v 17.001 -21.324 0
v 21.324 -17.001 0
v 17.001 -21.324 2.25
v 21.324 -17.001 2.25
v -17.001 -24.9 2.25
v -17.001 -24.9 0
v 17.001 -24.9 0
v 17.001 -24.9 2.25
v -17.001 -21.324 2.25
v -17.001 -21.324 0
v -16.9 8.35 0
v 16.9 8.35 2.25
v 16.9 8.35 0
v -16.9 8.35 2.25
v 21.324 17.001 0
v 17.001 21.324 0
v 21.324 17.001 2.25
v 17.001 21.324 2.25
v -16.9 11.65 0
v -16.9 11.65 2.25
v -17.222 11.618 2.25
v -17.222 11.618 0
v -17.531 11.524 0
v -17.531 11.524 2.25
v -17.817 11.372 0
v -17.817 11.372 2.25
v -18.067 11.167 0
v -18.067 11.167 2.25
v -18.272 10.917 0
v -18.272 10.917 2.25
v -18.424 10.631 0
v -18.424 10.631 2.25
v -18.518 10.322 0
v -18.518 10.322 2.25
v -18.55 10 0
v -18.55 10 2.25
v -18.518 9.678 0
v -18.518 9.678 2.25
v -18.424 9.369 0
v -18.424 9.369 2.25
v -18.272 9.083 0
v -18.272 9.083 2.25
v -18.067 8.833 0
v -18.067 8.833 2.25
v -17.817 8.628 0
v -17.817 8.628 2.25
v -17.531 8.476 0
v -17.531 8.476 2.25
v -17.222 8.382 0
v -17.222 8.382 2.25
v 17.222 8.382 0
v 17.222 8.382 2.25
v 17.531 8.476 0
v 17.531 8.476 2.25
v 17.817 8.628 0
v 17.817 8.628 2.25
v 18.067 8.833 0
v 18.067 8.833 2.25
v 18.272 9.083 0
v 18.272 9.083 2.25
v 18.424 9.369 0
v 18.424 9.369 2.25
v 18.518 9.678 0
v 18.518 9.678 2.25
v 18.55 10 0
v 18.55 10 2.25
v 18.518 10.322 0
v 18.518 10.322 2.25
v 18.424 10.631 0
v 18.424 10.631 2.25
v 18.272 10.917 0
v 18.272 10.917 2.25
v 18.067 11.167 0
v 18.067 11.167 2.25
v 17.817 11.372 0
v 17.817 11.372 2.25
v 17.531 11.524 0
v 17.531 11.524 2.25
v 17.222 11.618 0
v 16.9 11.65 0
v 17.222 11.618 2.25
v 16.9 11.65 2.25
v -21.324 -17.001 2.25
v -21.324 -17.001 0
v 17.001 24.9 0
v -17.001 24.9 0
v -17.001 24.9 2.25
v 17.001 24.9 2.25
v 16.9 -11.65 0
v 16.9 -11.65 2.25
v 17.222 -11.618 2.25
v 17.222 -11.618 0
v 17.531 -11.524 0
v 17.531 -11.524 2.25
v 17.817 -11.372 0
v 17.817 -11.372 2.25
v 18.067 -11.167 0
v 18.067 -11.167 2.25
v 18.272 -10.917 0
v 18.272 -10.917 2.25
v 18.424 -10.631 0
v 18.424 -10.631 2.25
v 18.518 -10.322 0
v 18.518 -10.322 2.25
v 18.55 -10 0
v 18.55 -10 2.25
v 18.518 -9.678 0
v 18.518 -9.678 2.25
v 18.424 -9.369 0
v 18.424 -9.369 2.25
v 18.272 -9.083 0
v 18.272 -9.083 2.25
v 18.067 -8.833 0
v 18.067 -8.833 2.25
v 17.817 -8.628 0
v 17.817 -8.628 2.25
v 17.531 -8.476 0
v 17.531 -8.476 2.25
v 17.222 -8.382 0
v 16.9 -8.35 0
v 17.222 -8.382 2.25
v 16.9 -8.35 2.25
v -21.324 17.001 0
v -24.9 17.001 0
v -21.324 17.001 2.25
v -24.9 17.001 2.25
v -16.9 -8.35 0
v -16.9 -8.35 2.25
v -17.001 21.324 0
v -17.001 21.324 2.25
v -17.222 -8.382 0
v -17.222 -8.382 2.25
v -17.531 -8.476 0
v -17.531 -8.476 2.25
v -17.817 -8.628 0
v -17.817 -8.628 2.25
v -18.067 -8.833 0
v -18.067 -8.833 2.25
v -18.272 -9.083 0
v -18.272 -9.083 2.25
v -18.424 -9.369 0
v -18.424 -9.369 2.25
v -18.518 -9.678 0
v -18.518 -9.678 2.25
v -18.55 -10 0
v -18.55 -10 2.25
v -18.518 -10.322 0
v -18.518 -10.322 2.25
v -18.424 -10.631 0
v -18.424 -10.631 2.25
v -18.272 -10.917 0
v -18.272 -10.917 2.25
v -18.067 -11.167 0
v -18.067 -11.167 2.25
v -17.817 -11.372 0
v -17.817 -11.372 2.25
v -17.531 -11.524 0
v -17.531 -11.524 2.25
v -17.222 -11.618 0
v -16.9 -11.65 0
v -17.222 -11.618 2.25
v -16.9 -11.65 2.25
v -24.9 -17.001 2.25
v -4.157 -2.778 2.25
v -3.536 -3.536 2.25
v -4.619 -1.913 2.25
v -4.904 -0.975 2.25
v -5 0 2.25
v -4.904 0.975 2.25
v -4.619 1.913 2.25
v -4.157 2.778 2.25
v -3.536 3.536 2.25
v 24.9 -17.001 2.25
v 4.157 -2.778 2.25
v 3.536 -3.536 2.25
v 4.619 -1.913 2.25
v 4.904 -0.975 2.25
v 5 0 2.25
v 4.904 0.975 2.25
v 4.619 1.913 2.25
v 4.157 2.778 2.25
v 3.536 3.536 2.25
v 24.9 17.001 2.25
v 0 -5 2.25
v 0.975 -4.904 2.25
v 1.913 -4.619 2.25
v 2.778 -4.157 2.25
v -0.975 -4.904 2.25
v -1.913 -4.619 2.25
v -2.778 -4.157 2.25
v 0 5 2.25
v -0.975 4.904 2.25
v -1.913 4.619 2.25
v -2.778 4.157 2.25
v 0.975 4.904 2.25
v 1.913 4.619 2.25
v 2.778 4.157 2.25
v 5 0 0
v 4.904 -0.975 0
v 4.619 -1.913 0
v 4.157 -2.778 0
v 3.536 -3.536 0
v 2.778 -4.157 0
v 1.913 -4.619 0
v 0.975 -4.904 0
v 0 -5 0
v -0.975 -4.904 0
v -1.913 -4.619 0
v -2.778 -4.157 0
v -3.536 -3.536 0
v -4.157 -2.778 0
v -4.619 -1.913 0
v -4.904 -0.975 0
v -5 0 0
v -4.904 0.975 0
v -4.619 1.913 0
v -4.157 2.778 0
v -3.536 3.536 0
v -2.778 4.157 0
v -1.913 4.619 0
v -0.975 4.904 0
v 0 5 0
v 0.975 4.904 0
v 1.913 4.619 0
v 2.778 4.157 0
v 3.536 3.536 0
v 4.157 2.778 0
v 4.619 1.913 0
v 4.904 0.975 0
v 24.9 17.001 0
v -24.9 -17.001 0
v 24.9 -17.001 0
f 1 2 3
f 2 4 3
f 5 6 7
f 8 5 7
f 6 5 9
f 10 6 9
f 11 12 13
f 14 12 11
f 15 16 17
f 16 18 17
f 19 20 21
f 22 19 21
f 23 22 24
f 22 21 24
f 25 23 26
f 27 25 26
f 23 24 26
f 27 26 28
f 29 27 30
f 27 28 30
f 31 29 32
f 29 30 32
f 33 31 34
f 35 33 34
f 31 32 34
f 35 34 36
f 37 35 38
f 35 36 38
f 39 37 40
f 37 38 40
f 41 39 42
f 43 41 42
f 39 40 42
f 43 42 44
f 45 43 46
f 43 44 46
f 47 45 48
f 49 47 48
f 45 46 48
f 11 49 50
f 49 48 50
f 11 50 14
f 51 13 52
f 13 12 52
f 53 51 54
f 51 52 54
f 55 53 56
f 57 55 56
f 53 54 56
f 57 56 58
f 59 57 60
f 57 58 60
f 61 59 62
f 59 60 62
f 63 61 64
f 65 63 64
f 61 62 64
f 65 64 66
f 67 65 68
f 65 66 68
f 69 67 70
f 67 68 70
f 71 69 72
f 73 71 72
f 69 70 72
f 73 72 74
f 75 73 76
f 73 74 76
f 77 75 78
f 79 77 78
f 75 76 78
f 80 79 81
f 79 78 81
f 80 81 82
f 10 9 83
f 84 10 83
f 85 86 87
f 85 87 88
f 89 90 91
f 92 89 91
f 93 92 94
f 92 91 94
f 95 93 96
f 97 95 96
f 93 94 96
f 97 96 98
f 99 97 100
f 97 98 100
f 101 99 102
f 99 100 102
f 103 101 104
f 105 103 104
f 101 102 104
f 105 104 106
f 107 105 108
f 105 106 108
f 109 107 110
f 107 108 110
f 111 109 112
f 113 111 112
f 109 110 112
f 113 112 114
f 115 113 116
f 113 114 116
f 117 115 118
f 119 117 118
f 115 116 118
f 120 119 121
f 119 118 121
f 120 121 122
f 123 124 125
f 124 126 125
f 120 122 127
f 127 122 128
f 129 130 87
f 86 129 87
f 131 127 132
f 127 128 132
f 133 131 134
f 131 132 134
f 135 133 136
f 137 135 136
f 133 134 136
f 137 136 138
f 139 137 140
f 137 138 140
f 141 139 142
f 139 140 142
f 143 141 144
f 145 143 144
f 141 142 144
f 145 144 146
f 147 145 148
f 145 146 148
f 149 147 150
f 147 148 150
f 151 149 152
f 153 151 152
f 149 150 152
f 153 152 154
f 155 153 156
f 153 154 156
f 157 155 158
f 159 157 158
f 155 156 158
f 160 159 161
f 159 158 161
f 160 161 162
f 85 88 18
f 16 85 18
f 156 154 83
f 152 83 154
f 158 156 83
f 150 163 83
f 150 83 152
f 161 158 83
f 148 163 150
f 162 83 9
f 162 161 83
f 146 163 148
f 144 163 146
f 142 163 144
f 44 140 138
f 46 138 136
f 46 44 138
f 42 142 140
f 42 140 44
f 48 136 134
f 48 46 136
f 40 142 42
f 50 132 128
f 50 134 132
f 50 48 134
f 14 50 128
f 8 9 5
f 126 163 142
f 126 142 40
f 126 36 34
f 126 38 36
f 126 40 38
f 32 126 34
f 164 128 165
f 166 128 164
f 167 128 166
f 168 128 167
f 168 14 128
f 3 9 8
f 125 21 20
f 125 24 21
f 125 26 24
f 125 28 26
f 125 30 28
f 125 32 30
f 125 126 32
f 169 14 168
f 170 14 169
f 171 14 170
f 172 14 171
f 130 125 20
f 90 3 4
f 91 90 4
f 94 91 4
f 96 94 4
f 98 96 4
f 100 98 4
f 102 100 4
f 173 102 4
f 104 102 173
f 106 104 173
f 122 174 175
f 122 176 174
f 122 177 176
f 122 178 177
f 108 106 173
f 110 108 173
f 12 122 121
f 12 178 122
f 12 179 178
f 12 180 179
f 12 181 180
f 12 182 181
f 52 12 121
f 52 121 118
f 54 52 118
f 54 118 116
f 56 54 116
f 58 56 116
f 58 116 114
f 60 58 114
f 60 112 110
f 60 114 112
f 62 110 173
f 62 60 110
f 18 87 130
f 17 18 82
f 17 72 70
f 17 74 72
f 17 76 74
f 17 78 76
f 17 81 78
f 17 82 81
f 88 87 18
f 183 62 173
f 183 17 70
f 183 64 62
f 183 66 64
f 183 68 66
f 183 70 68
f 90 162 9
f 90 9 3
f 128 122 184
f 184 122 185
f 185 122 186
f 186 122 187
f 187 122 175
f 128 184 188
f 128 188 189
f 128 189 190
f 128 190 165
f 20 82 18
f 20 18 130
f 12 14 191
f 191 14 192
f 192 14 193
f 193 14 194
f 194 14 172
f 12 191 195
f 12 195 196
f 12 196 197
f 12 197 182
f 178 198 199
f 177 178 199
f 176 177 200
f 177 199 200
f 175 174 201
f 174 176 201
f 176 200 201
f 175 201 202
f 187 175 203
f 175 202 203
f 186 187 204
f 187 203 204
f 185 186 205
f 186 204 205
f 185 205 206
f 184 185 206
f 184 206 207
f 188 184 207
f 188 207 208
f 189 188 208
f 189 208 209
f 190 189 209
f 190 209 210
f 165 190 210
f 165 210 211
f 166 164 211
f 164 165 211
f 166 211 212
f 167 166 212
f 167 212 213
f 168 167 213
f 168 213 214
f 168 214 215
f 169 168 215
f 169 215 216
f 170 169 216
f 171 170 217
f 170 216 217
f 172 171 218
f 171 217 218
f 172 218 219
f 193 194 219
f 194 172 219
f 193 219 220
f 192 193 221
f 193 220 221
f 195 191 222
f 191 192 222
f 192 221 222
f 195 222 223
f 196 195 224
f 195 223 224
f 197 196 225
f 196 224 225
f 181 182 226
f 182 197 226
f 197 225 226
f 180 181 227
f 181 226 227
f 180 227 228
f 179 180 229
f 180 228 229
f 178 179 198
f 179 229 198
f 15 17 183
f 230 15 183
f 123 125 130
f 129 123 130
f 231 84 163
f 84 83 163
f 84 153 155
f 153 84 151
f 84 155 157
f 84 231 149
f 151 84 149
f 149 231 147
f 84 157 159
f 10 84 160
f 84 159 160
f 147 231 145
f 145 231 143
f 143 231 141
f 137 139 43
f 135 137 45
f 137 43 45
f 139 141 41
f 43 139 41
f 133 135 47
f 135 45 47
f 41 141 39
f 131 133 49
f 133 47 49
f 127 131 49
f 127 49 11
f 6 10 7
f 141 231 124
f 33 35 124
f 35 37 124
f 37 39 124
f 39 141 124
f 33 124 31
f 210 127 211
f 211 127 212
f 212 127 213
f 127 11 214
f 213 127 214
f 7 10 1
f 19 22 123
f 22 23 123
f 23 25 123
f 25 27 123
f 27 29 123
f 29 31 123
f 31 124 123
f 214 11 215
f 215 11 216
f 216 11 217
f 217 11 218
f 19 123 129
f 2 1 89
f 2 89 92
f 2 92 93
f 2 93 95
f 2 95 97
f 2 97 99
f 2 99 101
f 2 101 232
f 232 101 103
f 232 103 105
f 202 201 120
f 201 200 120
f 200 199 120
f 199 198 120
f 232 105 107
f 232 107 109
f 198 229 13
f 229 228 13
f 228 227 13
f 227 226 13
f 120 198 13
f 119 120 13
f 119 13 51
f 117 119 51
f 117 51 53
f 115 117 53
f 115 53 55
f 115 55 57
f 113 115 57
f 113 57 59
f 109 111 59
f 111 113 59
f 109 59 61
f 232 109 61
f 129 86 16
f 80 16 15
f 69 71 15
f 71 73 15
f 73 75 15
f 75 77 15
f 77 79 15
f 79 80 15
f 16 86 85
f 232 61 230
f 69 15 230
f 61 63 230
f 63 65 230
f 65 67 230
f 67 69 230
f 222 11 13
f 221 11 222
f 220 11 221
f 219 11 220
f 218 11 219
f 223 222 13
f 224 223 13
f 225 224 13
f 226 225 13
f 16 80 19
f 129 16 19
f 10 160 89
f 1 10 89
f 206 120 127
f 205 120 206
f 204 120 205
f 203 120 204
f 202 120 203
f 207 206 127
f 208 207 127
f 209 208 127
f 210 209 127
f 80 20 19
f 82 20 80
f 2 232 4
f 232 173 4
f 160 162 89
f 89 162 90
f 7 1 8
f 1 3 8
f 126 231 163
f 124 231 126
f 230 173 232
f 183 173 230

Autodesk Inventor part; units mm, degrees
ref_plane "YZ Plane" through (0, 0, 0) normal (1, 0, 0) x (0, 1, 0)
ref_plane "Work Plane1" through (-29.1, -14.5, 2.4) normal (0, 0, -1) x (0, 1, 0)
ref_plane "Work Plane2" through (-13.8999, -10.5497, 2.25) normal (0, 0, -1) x (0, 1, 0)
sketch "Sketch1" plane through (0, 0, 0) normal (0, 0, 1) x (1, 0, 0)
  line L0 (-34.86, 0) -> (34.86, 0) construction
  line L1 (0, -34.86) -> (0, 34.86) construction
  line L2 (0, 0) -> (11.1575, 11.1575) construction
  line L3 (0, 0) -> (15.7791, 0) construction
  line L4 (0, 24.9) -> (16.8009, 24.9)
  line L5 (16.8009, 24.9) -> (16.8009, 21.2415)
  line L6 (16.8009, 21.2415) -> (19.0212, 19.0212)
  line L7 (24.9, 0) -> (24.9, 16.8009)
  line L8 (24.9, 16.8009) -> (21.2415, 16.8009)
  line L9 (21.2415, 16.8009) -> (19.0212, 19.0212)
  line L10 (0, -24.9) -> (16.8009, -24.9)
  line L11 (16.8009, -24.9) -> (16.8009, -21.2415)
  line L12 (16.8009, -21.2415) -> (19.0212, -19.0212)
  line L13 (24.9, 0) -> (24.9, -16.8009)
  line L14 (24.9, -16.8009) -> (21.2415, -16.8009)
  line L15 (21.2415, -16.8009) -> (19.0212, -19.0212)
  line L16 (0, 24.9) -> (-16.8009, 24.9)
  line L17 (-16.8009, 24.9) -> (-16.8009, 21.2415)
  line L18 (-16.8009, 21.2415) -> (-19.0212, 19.0212)
  line L19 (-24.9, 16.8009) -> (-21.2415, 16.8009)
  line L20 (-21.2415, 16.8009) -> (-19.0212, 19.0212)
  line L21 (0, -24.9) -> (-16.8009, -24.9)
  line L22 (-16.8009, -24.9) -> (-16.8009, -21.2415)
  line L23 (-16.8009, -21.2415) -> (-19.0212, -19.0212)
  line L24 (-21.2415, -16.8009) -> (-19.0212, -19.0212)
  line L25 (-24.9, -16.8009) -> (-21.2415, -16.8009)
  line L26 (-24.9, 0) -> (-24.9, -16.8009)
  line L27 (-24.9, 0) -> (-24.9, 16.8009)
  circle A0 centre (0, 0) radius 5
  dimension "d0" = 45
  dimension "d2" = 24.9
  dimension "d3" = 3.14
  dimension "d4" = 26.9
  dimension "d5" = 10
extrude "Extrusion1" add sketch "Sketch1" along normal up to surface (2.25 mm away)
sketch "Sketch5" plane through (0, 0, 0) normal (0, 0, -1) x (-1, 0, 0)
  circle A0 centre (-9.7, 10) radius 1.4
  circle A1 centre (-9.7, -10) radius 1.4
  circle A2 centre (13.8, 0) radius 1.4
  circle A3 centre (-10, 6.9) radius 0.75
  circle A4 centre (10, 6.9) radius 1.25
  point P0 (0, 0)
hole "Hole1" at (9.7, -10, 0) at (9.7, 10, 0) direction (0, 0, 1) diameter 3.3 depth 12 tip angle 118
sketch "Sketch6" plane through (-16.8009, 24.9, 2.25) normal (0, 0, 1) x (1, 0, 0)
  circle A0 centre (26.5009, -34.9) radius 1.65 construction
  circle A1 centre (26.5009, -14.9) radius 1.65 construction
  circle A2 centre (16.8009, -24.9) radius 5 construction
  line L0 (33.6017, -3.6585) -> (33.6017, 0) construction
  line L1 (33.6017, 0) -> (0, 0) construction
  line L2 (0, 0) -> (0, -3.6585) construction
  line L3 (0, -3.6585) -> (-4.4406, -8.0991) construction
  line L4 (-4.4406, -8.0991) -> (-8.0991, -8.0991) construction
  line L5 (-8.0991, -8.0991) -> (-8.0991, -41.7009) construction
  line L6 (-8.0991, -41.7009) -> (-4.4406, -41.7009) construction
  line L7 (-4.4406, -41.7009) -> (0, -46.1415) construction
  line L8 (0, -46.1415) -> (0, -49.8) construction
  line L9 (0, -49.8) -> (33.6017, -49.8) construction
  line L10 (33.6017, -49.8) -> (33.6017, -46.1415) construction
  line L11 (33.6017, -46.1415) -> (38.0423, -41.7009) construction
  line L12 (38.0423, -41.7009) -> (41.7009, -41.7009) construction
  line L13 (41.7009, -41.7009) -> (41.7009, -8.0991) construction
  line L14 (41.7009, -8.0991) -> (38.0423, -8.0991) construction
  line L15 (38.0423, -8.0991) -> (33.6017, -3.6585) construction
  line L16 (33.7009, -14.9) -> (-0.0991, -14.9)
  line L17 (33.7009, -16.55) -> (-0.0991, -16.55)
  line L18 (-0.0991, -13.25) -> (33.7009, -13.25)
  arc A3 (33.7009, -16.55) -> (33.7009, -13.25) centre (33.7009, -14.9) ccw
  arc A4 (-0.0991, -13.25) -> (-0.0991, -16.55) centre (-0.0991, -14.9) ccw
  line L19 (-8.0991, -41.7009) -> (-8.0991, -8.0991) construction
  line L20 (-8.0991, -24.9) -> (41.7009, -24.9) construction
  line L21 (41.7009, -8.0991) -> (41.7009, -41.7009) construction
  circle A5 centre (26.5009, -34.9) radius 1.65 construction
  line L22 (33.7009, -34.9) -> (-0.0991, -34.9)
  line L23 (33.7009, -33.25) -> (-0.0991, -33.25)
  line L24 (-0.0991, -36.55) -> (33.7009, -36.55)
  arc A6 (33.7009, -36.55) -> (33.7009, -33.25) centre (33.7009, -34.9) ccw
  arc A7 (-0.0991, -33.25) -> (-0.0991, -36.55) centre (-0.0991, -34.9) ccw
  point P0 (16.8009, -24.9)
  point P1 (16.8009, -14.9)
  point P2 (16.8009, -34.9)
  dimension "d25" = 8
  dimension "d26" = 8
extrude "Extrusion5" cut sketch "Sketch6" against normal through all
sketch "Skizze7" plane through (-16.8009, 24.9, 2.25) normal (0, 0, 1) x (1, 0, 0)
  line L0 (33.7009, -16.55) -> (-0.0991, -16.55) construction
  arc A0 (-0.0991, -13.25) -> (-0.0991, -16.55) centre (-0.0991, -14.9) ccw construction
  line L1 (-0.0991, -13.25) -> (33.7009, -13.25) construction
  arc A1 (33.7009, -16.55) -> (33.7009, -13.25) centre (33.7009, -14.9) ccw construction
  line L2 (-0.0991, -33.25) -> (33.7009, -33.25) construction
  arc A2 (33.7009, -36.55) -> (33.7009, -33.25) centre (33.7009, -34.9) ccw construction
  line L3 (33.7009, -36.55) -> (-0.0991, -36.55) construction
  arc A3 (-0.0991, -33.25) -> (-0.0991, -36.55) centre (-0.0991, -34.9) ccw construction
  circle A4 centre (16.8009, -24.9) radius 5 construction
  line L4 (33.6017, -3.6585) -> (33.6017, 0) projected
  line L5 (33.6017, 0) -> (0, 0) construction
  line L6 (0, 0) -> (0, -3.6585) projected
  line L7 (0, -3.6585) -> (-4.4406, -8.0991) projected
  line L8 (-4.4406, -8.0991) -> (-8.0991, -8.0991) projected
  line L9 (-8.0991, -8.0991) -> (-8.0991, -41.7009) construction
  line L10 (-8.0991, -41.7009) -> (-4.4406, -41.7009) projected
  line L11 (-4.4406, -41.7009) -> (0, -46.1415) projected
  line L12 (0, -46.1415) -> (0, -49.8) projected
  line L13 (0, -49.8) -> (33.6017, -49.8) construction
  line L14 (33.6017, -49.8) -> (33.6017, -46.1415) projected
  line L15 (33.6017, -46.1415) -> (38.0423, -41.7009) projected
  line L16 (38.0423, -41.7009) -> (41.7009, -41.7009) projected
  line L17 (41.7009, -41.7009) -> (41.7009, -8.0991) construction
  line L18 (41.7009, -8.0991) -> (38.0423, -8.0991) projected
  line L19 (38.0423, -8.0991) -> (33.6017, -3.6585) projected
  line L20 (-0.2, 0.2) -> (33.8017, 0.2) construction
  line L21 (33.8017, 0.2) -> (33.8017, -3.5757)
  line L22 (33.8017, -3.5757) -> (38.1252, -7.8991)
  line L23 (38.1252, -7.8991) -> (41.9009, -7.8991)
  line L24 (41.9009, -7.8991) -> (41.9009, -41.9009) construction
  line L25 (41.9009, -41.9009) -> (38.1252, -41.9009)
  line L26 (38.1252, -41.9009) -> (33.8017, -46.2243)
  line L27 (33.8017, -46.2243) -> (33.8017, -50)
  line L28 (33.8017, -50) -> (-0.2, -50) construction
  line L29 (-0.2, -50) -> (-0.2, -46.2243)
  line L30 (-0.2, -46.2243) -> (-4.5235, -41.9009)
  line L31 (-4.5235, -41.9009) -> (-8.2991, -41.9009)
  line L32 (-8.2991, -41.9009) -> (-8.2991, -7.8991) construction
  line L33 (-8.2991, -7.8991) -> (-4.5235, -7.8991)
  line L34 (-4.5235, -7.8991) -> (-0.2, -3.5757)
  line L35 (-0.2, -3.5757) -> (-0.2, 0.2)
  line L36 (33.6017, 0) -> (0, 0) projected
  line L37 (0, 0) -> (-0.2, 0)
  line L38 (-8.0991, -41.7009) -> (-8.0991, -8.0991) projected
  line L39 (-8.0991, -8.0991) -> (-8.0991, -7.8991)
  line L40 (33.6017, 0) -> (33.6017, -3.6585) projected
  line L41 (33.6017, 0) -> (33.8017, 0)
  line L42 (41.7009, -8.0991) -> (41.7009, -7.8991)
  line L43 (41.7009, -41.7009) -> (38.0423, -41.7009) projected
  line L44 (41.7009, -41.7009) -> (41.7009, -41.9009)
  line L45 (33.6017, -49.8) -> (33.8017, -49.8)
  line L46 (0, -49.8) -> (0, -46.1415) projected
  line L47 (0, -49.8) -> (-0.2, -49.8)
  line L48 (-8.0991, -41.7009) -> (-8.0991, -41.9009)
  point P0 (16.8009, -24.9)
  dimension "d29" = 0.2
extrude "IM_offset" add sketch "Skizze7" against normal up to surface (2.25 mm away)
properties part number "20_Cube_insert_Sample_holder"
